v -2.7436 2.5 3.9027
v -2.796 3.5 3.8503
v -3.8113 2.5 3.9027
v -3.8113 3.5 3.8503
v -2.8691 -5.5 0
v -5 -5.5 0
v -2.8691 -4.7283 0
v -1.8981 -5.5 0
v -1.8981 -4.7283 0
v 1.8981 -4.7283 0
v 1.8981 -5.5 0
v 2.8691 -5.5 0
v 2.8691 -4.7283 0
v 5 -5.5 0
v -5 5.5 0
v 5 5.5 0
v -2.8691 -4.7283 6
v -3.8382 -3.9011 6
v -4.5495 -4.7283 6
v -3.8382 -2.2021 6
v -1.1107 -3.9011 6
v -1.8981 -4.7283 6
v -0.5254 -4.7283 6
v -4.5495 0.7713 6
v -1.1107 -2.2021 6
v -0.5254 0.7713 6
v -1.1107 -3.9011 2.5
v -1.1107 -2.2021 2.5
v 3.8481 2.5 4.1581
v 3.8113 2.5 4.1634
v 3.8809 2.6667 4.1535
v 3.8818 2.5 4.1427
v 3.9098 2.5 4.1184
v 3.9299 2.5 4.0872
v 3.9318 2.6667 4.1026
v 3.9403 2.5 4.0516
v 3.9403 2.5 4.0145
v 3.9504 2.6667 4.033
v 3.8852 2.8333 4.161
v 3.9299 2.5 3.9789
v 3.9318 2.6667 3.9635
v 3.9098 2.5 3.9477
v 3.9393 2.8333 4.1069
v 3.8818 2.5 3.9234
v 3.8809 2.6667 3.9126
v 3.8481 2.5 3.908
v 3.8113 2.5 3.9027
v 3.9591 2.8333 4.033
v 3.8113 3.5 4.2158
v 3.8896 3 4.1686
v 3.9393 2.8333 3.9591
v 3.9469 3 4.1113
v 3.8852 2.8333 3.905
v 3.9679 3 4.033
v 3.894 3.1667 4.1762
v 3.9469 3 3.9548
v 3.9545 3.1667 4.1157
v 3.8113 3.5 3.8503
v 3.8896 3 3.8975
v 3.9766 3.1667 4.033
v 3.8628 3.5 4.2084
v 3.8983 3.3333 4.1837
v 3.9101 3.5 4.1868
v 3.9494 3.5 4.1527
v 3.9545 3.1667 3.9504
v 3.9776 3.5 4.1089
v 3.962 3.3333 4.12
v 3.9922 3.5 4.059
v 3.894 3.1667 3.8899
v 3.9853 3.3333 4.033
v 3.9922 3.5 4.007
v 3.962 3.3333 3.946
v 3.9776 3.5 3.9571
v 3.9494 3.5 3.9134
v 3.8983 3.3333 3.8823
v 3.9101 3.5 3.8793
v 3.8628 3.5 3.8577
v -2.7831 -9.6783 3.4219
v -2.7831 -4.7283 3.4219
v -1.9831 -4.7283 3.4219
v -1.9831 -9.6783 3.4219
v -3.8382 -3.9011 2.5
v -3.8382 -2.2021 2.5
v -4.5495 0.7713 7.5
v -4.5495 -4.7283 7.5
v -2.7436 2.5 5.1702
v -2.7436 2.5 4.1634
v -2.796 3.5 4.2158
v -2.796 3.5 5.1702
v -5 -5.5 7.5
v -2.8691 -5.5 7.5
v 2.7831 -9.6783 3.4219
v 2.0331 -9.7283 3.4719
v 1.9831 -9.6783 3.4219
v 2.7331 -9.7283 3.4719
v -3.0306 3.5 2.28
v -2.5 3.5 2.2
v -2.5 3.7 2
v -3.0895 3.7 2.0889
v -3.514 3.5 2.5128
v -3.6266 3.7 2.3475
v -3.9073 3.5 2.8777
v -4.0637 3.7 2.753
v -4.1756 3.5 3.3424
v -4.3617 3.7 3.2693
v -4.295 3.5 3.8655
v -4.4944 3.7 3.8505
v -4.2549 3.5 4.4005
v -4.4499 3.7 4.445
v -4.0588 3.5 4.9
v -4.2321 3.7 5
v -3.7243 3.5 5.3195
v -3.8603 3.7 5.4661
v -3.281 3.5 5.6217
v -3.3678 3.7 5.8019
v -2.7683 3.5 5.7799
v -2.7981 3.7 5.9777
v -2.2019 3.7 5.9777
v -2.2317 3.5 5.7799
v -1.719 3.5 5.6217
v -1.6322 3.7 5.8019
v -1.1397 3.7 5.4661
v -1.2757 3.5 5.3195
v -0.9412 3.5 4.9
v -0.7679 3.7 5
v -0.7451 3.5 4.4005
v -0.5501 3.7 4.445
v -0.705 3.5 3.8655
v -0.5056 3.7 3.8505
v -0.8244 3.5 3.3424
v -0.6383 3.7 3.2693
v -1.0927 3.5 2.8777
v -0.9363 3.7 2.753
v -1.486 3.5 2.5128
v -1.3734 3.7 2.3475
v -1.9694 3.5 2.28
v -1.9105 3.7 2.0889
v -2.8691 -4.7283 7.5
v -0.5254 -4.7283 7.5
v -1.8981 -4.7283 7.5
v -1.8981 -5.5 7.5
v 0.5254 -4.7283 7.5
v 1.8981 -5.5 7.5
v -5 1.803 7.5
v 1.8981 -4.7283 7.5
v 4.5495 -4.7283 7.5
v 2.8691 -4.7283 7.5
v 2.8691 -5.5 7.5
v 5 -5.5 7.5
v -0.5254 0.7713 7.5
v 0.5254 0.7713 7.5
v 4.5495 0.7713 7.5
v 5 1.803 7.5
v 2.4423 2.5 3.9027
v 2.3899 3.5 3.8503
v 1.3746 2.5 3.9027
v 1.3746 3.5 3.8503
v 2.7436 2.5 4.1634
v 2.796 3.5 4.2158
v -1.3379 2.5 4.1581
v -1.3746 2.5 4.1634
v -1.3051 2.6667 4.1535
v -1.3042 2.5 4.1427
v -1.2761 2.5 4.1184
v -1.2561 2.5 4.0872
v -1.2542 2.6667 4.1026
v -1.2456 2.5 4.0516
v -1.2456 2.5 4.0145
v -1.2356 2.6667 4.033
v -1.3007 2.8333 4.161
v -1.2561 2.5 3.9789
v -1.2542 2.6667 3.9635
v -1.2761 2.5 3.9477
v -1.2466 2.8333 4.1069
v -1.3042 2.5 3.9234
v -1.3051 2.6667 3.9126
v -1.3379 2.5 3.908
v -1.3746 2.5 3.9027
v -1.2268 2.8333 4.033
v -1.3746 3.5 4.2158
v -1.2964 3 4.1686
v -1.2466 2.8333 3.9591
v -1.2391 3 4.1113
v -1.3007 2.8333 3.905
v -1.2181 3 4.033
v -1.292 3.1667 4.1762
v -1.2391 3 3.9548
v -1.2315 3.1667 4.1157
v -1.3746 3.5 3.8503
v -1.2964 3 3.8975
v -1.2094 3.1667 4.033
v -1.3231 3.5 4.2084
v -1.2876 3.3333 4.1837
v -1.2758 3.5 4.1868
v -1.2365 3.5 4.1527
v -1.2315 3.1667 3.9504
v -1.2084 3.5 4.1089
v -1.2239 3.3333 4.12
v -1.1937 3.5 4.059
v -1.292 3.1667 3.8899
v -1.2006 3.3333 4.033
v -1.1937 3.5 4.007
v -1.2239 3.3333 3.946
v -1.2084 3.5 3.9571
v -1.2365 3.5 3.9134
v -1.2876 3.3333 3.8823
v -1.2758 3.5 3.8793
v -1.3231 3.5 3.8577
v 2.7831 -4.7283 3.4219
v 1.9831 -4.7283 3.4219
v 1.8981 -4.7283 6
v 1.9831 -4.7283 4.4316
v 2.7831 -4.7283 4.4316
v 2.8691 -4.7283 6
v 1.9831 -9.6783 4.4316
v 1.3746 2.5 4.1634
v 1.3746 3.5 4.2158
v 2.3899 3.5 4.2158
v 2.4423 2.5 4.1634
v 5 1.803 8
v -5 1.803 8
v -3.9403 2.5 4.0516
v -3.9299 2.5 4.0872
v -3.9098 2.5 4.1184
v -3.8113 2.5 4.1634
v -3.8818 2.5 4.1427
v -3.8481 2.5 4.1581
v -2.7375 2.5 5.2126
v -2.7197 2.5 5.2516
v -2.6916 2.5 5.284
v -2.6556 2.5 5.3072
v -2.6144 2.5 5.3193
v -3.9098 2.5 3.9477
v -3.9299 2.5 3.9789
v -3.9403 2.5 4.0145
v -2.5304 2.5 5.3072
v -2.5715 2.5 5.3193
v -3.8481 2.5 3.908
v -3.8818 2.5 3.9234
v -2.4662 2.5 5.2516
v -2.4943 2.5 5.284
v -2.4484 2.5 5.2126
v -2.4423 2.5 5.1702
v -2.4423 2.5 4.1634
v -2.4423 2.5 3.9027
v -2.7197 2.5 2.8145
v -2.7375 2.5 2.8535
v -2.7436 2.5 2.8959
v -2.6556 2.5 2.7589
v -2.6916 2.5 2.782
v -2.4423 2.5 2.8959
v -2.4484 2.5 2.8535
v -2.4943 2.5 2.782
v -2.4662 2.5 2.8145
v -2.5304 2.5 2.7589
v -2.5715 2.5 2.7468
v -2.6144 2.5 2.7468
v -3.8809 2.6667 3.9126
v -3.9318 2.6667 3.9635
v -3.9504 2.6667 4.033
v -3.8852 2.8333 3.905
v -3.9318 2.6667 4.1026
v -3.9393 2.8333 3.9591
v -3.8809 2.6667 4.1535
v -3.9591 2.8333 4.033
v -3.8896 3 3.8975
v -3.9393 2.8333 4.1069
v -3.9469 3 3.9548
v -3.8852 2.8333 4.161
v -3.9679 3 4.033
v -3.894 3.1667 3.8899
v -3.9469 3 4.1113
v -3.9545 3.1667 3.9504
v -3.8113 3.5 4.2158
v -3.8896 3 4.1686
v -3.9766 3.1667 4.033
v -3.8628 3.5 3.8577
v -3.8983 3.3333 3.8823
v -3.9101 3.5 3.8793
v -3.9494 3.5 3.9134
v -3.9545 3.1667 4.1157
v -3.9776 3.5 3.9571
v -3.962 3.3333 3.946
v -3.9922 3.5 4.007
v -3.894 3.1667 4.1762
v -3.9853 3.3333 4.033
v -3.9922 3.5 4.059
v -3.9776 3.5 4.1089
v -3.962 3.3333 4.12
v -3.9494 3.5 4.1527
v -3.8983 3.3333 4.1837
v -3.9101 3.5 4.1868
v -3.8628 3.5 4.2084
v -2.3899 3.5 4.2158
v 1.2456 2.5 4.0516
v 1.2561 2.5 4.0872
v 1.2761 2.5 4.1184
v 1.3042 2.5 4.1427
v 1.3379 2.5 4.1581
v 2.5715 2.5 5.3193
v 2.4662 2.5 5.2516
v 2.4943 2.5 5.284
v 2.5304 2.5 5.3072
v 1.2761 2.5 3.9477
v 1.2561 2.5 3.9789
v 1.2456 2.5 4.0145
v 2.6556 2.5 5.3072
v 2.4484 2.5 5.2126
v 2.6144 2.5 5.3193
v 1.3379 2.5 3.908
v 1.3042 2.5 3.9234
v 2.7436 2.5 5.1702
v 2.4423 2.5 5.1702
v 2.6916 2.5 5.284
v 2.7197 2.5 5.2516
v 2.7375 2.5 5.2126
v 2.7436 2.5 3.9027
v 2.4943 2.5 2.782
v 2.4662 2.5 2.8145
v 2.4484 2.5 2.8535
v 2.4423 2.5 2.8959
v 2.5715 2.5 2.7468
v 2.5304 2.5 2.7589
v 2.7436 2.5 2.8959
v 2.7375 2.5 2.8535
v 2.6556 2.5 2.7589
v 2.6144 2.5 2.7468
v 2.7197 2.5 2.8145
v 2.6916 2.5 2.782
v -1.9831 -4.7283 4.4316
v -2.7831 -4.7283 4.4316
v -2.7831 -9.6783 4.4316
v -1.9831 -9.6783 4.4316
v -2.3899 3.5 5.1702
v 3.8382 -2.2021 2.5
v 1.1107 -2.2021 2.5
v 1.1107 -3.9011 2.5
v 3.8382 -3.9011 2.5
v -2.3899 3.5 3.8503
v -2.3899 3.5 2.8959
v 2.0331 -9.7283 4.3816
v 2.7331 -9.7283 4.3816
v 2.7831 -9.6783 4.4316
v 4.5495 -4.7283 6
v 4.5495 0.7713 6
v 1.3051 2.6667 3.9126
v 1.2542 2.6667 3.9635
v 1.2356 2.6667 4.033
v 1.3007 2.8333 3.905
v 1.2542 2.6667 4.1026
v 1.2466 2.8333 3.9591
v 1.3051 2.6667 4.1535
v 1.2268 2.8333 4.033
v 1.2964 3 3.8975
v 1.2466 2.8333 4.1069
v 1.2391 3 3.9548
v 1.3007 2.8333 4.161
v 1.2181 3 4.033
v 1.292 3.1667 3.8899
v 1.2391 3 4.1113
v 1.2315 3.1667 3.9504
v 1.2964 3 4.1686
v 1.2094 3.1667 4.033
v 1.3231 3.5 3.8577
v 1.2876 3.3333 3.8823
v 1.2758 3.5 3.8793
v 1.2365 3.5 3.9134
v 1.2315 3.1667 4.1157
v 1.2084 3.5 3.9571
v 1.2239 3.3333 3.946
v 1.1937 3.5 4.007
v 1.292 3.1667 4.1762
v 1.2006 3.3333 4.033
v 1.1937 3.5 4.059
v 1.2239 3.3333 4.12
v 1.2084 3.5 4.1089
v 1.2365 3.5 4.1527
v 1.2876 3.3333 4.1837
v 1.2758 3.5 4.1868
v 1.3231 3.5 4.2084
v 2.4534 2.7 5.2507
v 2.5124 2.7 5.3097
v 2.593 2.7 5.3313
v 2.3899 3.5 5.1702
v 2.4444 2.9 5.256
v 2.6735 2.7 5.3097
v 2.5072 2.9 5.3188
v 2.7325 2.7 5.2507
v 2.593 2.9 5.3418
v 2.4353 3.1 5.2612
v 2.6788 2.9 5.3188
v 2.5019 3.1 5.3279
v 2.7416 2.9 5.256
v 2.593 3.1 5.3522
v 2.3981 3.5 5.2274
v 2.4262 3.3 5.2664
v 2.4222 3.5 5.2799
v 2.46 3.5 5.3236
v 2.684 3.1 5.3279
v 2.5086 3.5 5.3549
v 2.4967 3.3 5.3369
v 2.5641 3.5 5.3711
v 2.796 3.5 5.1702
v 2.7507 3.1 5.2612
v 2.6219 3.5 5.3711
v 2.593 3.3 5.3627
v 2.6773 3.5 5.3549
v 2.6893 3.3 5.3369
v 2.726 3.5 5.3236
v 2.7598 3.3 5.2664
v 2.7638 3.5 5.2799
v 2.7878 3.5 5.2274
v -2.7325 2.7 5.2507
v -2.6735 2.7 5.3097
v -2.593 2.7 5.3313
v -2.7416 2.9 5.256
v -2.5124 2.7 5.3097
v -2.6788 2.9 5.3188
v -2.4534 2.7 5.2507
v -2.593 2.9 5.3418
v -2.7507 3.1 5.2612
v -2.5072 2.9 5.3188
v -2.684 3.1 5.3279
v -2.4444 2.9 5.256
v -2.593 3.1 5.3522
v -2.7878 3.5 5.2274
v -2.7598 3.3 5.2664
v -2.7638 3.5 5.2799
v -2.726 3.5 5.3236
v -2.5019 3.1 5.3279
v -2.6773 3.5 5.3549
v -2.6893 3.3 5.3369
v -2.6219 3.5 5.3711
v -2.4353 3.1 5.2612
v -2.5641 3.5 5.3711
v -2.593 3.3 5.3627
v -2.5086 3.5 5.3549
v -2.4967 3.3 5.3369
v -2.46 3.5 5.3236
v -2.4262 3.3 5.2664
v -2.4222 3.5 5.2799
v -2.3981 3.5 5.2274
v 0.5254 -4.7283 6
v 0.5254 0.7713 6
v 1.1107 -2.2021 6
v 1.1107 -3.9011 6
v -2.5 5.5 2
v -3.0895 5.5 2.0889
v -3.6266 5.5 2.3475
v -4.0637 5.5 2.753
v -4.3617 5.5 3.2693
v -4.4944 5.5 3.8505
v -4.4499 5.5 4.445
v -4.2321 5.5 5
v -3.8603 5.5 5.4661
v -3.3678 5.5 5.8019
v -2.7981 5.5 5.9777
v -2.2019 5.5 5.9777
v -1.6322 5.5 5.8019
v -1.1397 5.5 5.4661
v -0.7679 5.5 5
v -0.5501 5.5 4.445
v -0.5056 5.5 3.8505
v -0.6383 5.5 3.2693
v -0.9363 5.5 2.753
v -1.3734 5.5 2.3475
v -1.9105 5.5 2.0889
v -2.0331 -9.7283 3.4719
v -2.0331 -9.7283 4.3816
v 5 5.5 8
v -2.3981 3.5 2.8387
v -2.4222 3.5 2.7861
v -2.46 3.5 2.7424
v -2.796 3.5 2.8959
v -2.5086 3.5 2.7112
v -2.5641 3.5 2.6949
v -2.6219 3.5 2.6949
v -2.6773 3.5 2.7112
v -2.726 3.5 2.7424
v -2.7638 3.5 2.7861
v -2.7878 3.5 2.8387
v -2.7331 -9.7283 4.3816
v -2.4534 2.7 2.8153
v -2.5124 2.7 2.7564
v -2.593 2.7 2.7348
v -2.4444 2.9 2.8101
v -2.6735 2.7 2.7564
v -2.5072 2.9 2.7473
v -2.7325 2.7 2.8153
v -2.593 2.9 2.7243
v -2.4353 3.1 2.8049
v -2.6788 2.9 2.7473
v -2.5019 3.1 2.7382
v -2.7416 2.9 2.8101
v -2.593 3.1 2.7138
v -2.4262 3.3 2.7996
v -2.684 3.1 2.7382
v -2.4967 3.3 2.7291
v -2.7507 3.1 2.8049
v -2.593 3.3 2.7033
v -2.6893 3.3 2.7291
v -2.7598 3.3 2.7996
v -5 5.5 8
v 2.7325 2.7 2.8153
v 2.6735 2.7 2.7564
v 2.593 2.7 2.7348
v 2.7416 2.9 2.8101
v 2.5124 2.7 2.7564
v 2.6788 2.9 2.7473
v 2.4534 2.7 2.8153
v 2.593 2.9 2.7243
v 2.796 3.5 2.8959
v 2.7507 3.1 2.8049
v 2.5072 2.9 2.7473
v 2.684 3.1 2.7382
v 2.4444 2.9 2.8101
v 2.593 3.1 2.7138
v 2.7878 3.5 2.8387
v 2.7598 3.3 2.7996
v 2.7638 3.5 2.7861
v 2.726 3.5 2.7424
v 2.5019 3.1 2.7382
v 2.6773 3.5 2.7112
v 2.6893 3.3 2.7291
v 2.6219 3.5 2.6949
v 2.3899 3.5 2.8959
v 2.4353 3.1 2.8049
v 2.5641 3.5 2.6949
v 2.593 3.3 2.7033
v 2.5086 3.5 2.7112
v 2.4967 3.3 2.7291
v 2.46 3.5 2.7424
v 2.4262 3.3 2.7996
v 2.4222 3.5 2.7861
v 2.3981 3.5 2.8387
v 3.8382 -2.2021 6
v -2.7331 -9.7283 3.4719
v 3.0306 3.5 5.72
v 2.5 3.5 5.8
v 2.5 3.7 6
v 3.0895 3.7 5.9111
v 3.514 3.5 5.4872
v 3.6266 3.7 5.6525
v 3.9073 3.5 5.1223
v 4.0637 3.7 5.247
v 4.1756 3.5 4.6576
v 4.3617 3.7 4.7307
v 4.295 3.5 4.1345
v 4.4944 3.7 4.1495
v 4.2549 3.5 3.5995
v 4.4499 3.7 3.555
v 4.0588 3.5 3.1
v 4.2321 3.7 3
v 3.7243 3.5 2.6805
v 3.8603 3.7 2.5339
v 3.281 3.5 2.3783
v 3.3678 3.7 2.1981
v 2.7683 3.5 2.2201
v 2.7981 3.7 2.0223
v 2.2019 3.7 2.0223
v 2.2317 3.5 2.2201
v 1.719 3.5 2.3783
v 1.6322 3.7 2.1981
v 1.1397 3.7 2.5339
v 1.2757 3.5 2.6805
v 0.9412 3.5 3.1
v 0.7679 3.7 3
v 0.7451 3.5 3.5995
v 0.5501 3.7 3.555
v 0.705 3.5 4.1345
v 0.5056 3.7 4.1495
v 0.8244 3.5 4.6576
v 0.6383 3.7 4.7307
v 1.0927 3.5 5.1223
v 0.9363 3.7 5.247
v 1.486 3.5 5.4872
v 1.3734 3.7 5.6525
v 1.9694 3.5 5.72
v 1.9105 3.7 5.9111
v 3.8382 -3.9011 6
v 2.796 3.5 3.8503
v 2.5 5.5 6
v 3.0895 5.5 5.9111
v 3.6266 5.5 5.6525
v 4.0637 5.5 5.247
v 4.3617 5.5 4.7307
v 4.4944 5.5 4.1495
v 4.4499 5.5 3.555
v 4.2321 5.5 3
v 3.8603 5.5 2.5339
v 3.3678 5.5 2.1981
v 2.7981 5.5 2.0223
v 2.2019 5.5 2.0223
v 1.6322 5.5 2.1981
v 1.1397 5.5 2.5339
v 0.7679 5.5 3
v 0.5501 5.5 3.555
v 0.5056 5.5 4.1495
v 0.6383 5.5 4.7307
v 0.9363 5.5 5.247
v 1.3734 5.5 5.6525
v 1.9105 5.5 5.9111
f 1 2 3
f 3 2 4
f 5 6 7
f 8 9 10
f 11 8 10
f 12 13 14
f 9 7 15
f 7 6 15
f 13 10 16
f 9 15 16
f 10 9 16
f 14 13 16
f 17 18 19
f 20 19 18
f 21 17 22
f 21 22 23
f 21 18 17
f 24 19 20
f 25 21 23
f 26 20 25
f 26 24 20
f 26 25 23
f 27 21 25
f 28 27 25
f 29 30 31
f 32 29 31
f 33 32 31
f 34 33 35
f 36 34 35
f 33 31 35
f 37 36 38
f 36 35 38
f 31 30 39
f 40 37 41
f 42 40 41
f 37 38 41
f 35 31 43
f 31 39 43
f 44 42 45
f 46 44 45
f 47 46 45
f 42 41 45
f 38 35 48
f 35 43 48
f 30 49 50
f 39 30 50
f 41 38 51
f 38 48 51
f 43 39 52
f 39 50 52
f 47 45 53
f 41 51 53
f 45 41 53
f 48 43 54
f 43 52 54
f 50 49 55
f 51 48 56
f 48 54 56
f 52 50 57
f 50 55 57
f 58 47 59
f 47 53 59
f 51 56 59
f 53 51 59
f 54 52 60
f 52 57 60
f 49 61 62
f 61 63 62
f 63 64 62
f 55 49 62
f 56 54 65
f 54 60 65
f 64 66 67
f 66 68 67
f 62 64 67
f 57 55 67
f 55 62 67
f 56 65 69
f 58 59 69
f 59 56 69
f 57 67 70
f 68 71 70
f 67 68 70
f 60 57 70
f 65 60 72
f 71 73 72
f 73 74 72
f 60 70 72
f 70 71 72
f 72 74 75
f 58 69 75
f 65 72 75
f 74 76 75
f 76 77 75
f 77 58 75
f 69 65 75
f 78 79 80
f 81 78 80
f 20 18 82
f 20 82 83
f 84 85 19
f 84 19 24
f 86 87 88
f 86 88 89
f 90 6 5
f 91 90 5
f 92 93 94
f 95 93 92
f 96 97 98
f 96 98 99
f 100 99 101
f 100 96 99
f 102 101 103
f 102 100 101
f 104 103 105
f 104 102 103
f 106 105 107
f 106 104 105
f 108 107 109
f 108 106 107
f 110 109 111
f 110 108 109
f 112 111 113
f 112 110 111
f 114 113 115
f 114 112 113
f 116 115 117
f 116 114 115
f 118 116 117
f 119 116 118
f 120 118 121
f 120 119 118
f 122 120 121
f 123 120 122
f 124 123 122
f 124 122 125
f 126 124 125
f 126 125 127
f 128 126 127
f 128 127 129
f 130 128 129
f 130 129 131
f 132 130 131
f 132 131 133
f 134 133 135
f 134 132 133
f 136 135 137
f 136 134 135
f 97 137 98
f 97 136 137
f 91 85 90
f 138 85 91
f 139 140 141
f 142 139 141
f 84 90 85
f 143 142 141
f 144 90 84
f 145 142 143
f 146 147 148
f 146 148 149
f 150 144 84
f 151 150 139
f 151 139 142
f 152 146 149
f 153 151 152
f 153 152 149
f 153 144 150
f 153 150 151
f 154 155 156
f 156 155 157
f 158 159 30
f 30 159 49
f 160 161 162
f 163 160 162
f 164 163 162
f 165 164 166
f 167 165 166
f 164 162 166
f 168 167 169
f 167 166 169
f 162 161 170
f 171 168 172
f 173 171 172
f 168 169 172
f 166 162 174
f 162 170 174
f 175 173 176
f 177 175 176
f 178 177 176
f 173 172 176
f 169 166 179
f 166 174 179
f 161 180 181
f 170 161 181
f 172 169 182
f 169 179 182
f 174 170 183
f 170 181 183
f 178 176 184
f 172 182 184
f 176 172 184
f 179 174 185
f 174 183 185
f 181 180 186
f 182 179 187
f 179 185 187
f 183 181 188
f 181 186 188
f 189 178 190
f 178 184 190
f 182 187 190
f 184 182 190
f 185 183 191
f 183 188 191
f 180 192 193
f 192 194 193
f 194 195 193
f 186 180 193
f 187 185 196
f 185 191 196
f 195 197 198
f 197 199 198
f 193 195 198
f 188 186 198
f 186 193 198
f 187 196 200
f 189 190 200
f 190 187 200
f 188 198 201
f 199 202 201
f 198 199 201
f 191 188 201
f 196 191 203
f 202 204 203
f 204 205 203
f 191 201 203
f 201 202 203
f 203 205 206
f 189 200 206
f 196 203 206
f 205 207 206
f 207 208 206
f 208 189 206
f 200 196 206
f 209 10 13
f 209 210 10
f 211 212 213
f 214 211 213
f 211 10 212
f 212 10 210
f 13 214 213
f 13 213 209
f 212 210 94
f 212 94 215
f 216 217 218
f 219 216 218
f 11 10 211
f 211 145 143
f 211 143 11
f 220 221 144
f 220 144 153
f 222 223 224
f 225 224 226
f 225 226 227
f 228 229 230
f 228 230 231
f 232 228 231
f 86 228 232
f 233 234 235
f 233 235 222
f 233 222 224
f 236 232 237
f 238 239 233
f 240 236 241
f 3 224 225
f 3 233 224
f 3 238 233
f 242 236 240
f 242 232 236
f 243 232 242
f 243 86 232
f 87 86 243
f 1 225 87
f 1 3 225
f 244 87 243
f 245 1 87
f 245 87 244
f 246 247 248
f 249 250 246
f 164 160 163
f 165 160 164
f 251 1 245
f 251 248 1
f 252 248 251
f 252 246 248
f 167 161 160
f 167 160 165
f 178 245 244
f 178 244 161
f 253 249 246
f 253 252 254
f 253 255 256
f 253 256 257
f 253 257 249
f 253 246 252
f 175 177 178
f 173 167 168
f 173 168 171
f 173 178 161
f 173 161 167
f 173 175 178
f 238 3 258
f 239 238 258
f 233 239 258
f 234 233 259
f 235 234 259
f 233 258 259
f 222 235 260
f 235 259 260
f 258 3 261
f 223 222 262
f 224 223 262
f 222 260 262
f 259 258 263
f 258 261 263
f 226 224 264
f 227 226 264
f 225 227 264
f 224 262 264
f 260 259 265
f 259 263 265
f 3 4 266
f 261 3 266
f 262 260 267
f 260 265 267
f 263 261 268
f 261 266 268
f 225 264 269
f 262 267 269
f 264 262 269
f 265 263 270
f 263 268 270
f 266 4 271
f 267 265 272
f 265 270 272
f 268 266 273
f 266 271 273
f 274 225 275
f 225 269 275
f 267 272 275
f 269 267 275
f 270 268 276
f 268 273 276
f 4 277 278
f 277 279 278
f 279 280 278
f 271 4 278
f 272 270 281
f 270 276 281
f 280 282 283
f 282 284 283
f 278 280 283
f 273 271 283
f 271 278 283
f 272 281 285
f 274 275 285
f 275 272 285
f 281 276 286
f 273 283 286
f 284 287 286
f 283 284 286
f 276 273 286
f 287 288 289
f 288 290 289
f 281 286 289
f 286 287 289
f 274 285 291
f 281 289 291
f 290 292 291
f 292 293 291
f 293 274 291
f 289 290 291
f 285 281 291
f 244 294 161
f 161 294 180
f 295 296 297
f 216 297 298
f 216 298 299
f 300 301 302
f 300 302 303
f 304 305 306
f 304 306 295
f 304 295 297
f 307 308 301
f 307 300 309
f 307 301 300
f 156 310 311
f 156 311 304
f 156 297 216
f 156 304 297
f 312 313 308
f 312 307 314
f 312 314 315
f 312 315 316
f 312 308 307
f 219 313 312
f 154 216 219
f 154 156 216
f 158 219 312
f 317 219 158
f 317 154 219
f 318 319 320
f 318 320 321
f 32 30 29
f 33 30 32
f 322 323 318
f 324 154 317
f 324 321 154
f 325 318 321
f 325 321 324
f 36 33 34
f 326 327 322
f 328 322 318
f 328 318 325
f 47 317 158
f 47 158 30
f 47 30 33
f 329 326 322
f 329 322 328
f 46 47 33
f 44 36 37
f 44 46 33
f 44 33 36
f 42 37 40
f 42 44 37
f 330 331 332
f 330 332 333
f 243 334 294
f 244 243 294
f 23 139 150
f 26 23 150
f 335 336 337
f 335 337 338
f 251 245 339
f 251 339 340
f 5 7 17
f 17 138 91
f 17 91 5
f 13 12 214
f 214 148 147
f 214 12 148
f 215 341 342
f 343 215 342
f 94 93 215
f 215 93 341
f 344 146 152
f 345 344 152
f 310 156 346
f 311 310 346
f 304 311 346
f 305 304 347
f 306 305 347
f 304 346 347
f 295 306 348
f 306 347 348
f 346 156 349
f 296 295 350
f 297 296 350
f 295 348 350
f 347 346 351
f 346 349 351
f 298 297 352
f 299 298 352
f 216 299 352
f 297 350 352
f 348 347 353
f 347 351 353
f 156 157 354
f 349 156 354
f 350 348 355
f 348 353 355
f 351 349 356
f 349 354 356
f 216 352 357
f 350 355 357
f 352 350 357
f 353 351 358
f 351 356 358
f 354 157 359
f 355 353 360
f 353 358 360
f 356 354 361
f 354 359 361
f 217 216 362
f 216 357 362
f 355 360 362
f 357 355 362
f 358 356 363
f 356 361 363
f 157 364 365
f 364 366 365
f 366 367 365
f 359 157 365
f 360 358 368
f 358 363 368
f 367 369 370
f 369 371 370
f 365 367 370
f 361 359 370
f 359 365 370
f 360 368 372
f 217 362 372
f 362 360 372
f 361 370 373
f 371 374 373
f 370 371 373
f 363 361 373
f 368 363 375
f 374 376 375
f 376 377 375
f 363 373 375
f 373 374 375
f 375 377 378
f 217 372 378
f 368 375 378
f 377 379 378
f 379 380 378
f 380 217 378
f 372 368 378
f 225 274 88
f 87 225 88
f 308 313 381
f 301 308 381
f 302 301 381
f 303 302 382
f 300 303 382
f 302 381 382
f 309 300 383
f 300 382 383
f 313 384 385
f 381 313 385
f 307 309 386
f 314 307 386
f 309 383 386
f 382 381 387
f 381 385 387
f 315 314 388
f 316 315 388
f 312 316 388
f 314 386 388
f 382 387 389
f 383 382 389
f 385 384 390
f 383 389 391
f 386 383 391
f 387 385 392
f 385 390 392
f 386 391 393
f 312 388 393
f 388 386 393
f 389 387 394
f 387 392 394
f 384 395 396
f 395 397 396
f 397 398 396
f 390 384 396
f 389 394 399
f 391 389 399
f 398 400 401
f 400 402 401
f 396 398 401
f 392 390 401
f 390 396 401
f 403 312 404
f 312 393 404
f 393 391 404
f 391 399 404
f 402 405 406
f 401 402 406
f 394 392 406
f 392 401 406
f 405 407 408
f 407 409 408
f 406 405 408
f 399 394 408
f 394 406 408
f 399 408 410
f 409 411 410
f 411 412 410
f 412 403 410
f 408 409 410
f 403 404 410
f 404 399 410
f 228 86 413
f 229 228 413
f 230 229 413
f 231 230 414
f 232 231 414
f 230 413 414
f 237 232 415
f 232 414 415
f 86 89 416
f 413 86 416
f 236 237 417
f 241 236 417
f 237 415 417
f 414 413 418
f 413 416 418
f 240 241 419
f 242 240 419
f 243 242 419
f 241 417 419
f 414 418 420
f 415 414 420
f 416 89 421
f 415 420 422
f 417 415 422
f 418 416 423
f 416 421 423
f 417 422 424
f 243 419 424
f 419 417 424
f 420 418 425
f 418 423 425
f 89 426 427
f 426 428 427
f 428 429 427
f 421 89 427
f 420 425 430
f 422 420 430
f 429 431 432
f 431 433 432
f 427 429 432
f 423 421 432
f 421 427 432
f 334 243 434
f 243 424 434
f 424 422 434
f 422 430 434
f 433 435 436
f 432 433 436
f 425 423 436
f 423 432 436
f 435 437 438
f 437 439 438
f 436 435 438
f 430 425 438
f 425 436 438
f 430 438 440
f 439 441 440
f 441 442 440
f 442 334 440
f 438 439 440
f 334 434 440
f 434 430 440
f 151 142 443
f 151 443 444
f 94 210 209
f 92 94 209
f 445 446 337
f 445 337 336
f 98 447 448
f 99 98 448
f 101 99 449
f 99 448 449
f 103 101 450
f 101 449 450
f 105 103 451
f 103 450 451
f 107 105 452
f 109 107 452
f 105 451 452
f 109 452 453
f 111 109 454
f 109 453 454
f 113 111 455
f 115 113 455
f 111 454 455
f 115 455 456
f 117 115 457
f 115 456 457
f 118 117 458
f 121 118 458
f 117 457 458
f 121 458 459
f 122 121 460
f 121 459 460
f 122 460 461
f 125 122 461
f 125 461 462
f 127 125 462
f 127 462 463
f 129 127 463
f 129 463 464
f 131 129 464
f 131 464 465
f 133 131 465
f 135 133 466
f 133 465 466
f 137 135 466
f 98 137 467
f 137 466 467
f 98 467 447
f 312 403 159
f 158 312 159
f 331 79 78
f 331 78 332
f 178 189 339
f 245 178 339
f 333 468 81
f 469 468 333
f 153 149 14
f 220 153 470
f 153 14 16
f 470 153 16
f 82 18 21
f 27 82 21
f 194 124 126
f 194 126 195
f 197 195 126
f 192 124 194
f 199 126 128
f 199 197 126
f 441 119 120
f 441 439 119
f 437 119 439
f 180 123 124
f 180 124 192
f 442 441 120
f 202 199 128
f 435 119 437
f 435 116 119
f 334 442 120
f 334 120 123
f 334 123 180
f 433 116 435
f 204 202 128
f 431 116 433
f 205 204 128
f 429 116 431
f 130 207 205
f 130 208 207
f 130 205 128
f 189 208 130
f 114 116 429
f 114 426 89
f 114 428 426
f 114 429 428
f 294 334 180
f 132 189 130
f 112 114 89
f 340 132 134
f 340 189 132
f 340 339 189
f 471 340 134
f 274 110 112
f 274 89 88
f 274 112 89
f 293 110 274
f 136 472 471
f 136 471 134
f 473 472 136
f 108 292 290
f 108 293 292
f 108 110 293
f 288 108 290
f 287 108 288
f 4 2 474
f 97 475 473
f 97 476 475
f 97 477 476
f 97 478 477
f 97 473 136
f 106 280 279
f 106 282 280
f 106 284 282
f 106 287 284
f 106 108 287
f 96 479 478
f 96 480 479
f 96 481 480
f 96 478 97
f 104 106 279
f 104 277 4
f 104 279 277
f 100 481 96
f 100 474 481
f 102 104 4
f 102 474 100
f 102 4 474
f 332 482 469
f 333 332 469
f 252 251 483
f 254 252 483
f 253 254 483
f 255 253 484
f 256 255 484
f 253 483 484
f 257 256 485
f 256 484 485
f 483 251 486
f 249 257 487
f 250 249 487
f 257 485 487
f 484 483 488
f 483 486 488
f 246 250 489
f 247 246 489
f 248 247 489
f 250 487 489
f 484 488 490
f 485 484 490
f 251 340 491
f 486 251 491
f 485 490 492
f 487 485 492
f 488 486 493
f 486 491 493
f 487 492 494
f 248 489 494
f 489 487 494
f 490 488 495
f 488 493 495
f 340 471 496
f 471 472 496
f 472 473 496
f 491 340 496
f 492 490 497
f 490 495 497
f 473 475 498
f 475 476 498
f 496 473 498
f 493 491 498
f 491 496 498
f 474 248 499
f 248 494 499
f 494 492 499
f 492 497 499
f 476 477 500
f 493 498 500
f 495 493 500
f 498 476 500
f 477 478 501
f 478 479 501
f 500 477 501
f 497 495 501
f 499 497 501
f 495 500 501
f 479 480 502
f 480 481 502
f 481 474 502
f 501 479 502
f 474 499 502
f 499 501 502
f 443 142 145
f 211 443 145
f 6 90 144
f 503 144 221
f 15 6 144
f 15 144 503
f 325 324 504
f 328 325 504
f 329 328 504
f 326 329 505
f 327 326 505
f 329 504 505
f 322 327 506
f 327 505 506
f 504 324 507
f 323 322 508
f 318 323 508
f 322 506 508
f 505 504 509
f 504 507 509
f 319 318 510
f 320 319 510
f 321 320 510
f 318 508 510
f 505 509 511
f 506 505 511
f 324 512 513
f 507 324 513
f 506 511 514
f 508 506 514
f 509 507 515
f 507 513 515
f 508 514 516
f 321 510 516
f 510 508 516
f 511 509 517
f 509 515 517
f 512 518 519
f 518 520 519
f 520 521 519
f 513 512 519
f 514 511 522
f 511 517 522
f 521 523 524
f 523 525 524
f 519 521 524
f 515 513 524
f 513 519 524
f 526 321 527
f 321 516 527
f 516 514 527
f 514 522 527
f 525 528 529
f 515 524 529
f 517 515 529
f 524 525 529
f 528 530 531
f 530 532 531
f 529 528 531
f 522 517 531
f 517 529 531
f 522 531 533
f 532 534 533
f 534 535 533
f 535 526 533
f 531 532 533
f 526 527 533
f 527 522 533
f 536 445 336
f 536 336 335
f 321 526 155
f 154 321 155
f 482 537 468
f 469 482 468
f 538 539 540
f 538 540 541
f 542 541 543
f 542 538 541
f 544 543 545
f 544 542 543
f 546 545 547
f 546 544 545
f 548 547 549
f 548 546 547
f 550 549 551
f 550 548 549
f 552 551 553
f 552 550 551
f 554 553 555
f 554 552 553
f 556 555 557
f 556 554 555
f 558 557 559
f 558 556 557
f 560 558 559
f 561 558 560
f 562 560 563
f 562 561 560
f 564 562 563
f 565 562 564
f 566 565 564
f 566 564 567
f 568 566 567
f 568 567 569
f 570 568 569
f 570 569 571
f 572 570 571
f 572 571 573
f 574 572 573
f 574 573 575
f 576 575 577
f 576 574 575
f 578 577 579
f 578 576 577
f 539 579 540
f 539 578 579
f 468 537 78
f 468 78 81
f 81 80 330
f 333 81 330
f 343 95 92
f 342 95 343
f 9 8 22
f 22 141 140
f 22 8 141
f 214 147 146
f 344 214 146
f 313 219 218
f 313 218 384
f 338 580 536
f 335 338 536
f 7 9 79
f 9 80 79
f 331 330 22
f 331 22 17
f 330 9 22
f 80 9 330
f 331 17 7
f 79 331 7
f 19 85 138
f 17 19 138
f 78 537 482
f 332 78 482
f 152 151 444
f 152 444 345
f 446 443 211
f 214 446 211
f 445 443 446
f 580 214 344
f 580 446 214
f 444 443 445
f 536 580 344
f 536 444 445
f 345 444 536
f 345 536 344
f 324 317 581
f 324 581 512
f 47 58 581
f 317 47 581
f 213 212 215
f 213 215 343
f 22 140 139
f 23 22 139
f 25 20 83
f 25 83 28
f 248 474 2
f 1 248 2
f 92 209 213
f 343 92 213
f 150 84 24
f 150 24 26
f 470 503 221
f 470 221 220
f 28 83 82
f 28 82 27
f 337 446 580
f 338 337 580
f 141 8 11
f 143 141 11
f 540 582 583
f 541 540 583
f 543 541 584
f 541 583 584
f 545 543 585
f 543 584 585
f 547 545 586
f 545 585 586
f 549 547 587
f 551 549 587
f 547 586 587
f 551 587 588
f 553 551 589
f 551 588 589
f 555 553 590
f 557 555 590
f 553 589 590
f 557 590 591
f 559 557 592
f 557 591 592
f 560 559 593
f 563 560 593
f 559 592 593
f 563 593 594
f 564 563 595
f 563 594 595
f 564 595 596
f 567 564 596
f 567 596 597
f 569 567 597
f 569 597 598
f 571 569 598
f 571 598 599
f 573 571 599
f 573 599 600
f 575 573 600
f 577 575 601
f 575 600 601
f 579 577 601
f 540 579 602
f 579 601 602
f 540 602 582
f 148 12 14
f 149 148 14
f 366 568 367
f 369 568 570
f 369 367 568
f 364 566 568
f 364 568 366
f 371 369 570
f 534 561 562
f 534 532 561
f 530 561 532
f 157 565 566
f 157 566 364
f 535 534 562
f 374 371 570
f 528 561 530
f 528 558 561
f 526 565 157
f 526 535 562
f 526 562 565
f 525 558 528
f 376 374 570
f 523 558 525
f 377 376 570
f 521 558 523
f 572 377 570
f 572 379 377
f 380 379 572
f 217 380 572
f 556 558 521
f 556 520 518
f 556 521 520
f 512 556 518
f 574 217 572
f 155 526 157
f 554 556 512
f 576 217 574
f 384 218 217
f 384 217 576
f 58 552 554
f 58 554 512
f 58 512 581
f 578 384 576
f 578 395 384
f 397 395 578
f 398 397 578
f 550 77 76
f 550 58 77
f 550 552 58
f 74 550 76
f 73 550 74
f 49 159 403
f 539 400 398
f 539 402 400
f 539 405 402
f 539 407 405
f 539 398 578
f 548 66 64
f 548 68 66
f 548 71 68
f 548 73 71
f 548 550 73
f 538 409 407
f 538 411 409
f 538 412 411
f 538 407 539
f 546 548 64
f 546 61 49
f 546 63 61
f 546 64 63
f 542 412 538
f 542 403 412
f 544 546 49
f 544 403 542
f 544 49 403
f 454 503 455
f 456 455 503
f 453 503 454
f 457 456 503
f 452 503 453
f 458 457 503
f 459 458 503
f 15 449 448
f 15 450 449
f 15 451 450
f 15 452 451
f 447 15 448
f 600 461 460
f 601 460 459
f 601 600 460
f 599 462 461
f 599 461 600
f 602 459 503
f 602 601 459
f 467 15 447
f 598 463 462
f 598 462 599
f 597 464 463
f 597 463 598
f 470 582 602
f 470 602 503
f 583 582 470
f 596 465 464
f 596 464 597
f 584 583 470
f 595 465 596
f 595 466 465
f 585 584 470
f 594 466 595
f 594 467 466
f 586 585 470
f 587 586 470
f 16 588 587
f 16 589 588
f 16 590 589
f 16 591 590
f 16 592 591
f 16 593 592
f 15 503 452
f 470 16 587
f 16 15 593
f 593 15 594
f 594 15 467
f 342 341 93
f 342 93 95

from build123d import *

# Parameters (mm, degrees)
CROQUIS1_W                      = 10
CROQUIS1_H                      = 11
SALIENTE_EXTRUIR1_DEPTH         = 8
CROQUIS2_R                      = 2
CORTAR_EXTRUIR1_DEPTH           = 2
CROQUIS3_W                      = 10
CROQUIS3_H                      = 7.302971928
CORTAR_EXTRUIR2_DEPTH           = 0.5
CROQUIS4_W                      = 4.024100916
CROQUIS4_H                      = 5.499604586
CORTAR_EXTRUIR3_DEPTH           = 1.5
CROQUIS5_W                      = 2.727446176
CROQUIS5_H                      = 1.699064831
CORTAR_EXTRUIR4_DEPTH           = 3.5
CORTAR_EXTRUIR5_DEPTH           = 1
CORTAR_EXTRUIR5_DRAFT           = -3
CORTAR_EXTRUIR5_PROFILE_2_DEPTH = 1
CORTAR_EXTRUIR5_PROFILE_2_DRAFT = -3
CHAFL_N1_SIZE                   = 0.2
CORTAR_EXTRUIR6_DEPTH           = 11.559356041
CROQUIS8_W                      = 0.8
CROQUIS8_H                      = 1.009702069
SALIENTE_EXTRUIR2_DEPTH         = 5
CHAFL_N2_SIZE                   = 0.05


with BuildPart() as part:
    # Croquis1 → Saliente-Extruir1 (new body)
    with BuildSketch(Plane.XY):
        Rectangle(CROQUIS1_W, CROQUIS1_H)
    extrude(amount=SALIENTE_EXTRUIR1_DEPTH)

    # Croquis2 → Cortar-Extruir1 (cut)
    with BuildSketch(Plane(origin=(0, 5.5, 0), x_dir=(1, 0, 0), z_dir=(0, 1, 0))):
        with Locations(Location((2.5, -4, 0), (0, 0, 270))):
            Circle(CROQUIS2_R)
        with Locations(Location((-2.5, -4, 0), (0, 0, 90))):
            Circle(CROQUIS2_R)
    extrude(amount=-CORTAR_EXTRUIR1_DEPTH, mode=Mode.SUBTRACT)

    # Croquis3 → Cortar-Extruir2 (cut)
    with BuildSketch(Plane.XY.offset(8)):
        with Locations((0, -1.848514036)):
            Rectangle(CROQUIS3_W, CROQUIS3_H)
    extrude(amount=-CORTAR_EXTRUIR2_DEPTH, mode=Mode.SUBTRACT)

    # Croquis4 → Cortar-Extruir3 (cut)
    with BuildSketch(Plane.XY.offset(7.5)):
        with Locations((-2.537419189, -1.978516284)):
            Rectangle(CROQUIS4_W, CROQUIS4_H)
        with Locations((2.537419189, -1.978516284)):
            Rectangle(CROQUIS4_W, CROQUIS4_H)
    extrude(amount=-CORTAR_EXTRUIR3_DEPTH, mode=Mode.SUBTRACT)

    # Croquis5 → Cortar-Extruir4 (cut)
    with BuildSketch(Plane.XY.offset(6)):
        with Locations((-2.474433562, -3.051609862)):
            Rectangle(CROQUIS5_W, CROQUIS5_H)
        with Locations((2.474433562, -3.051609862)):
            Rectangle(CROQUIS5_W, CROQUIS5_H)
    extrude(amount=-CORTAR_EXTRUIR4_DEPTH, mode=Mode.SUBTRACT)


with BuildPart() as cortar_extruir5_tool:
    # Croquis6 → Cortar-Extruir5 (with draft: the straight prism first)
    with BuildSketch(Plane(origin=(0, 3.5, 0), x_dir=(1, 0, 0), z_dir=(0, 1, 0))):
        with BuildLine():
            Line((-2.796040432, -4.215779763), (-2.796040432, -5.17015319))
            ThreePointArc((-2.796040432, -5.17015319), (-2.592982256, -5.373211365), (-2.38992408, -5.17015319))
            Line((-2.38992408, -5.17015319), (-2.38992408, -4.215779763))
            Line((-2.38992408, -4.215779763), (-1.374633201, -4.215779763))
            ThreePointArc((-1.374633201, -4.215779763), (-1.191880843, -4.033027405), (-1.374633201, -3.850275046))
            Line((-1.374633201, -3.850275046), (-2.38992408, -3.850275046))
            Line((-2.38992408, -3.850275046), (-2.38992408, -2.89590162))
            ThreePointArc((-2.38992408, -2.89590162), (-2.592982256, -2.692843444), (-2.796040432, -2.89590162))
            Line((-2.796040432, -2.89590162), (-2.796040432, -3.850275046))
            Line((-2.796040432, -3.850275046), (-3.811331312, -3.850275046))
            ThreePointArc((-3.811331312, -3.850275046), (-3.99408367, -4.033027405), (-3.811331312, -4.215779763))
            Line((-3.811331312, -4.215779763), (-2.796040432, -4.215779763))
        make_face()
    extrude(amount=-CORTAR_EXTRUIR5_DEPTH)
    # Cortar-Extruir5: the draft: its side faces are tilted about the plane it starts from
    cortar_extruir5_sides = [cortar_extruir5_tool.faces().sort_by_distance(p)[0] for p in [
        (-2.796040432, 3, 3.373088333),
        (-3.303685872, 3, 3.850275046),
        (-3.99408367, 3, 4.033027405),
        (-3.303685872, 3, 4.215779763),
        (-2.796040432, 3, 4.692966476),
        (-2.592982256, 3, 5.373211365),
        (-2.38992408, 3, 4.692966476),
        (-1.882278641, 3, 4.215779763),
        (-1.191880843, 3, 4.033027405),
        (-1.882278641, 3, 3.850275046),
        (-2.38992408, 3, 3.373088333),
        (-2.592982256, 3, 2.692843444),
    ]]
    draft(cortar_extruir5_sides, Plane(origin=(0, 3.5, 0), x_dir=(1, 0, 0), z_dir=(0, 1, 0)), CORTAR_EXTRUIR5_DRAFT)


with BuildPart() as part_1:
    add(part.part)

    # Cortar-Extruir5: cut by cortar_extruir5_tool
    add(cortar_extruir5_tool.part, mode=Mode.SUBTRACT)


with BuildPart() as cortar_extruir5_profile_2_tool:
    # Croquis6 → Cortar-Extruir5 profile 2 (with draft: the straight prism first)
    with BuildSketch(Plane(origin=(0, 3.5, 0), x_dir=(1, 0, 0), z_dir=(0, 1, 0))):
        with BuildLine():
            Line((2.38992408, -4.215779763), (2.38992408, -5.17015319))
            ThreePointArc((2.38992408, -5.17015319), (2.592982256, -5.373211365), (2.796040432, -5.17015319))
            Line((2.796040432, -5.17015319), (2.796040432, -4.215779763))
            Line((2.796040432, -4.215779763), (3.811331312, -4.215779763))
            ThreePointArc((3.811331312, -4.215779763), (3.99408367, -4.033027405), (3.811331312, -3.850275046))
            Line((3.811331312, -3.850275046), (2.796040432, -3.850275046))
            Line((2.796040432, -3.850275046), (2.796040432, -2.89590162))
            ThreePointArc((2.796040432, -2.89590162), (2.592982256, -2.692843444), (2.38992408, -2.89590162))
            Line((2.38992408, -2.89590162), (2.38992408, -3.850275046))
            Line((2.38992408, -3.850275046), (1.374633201, -3.850275046))
            ThreePointArc((1.374633201, -3.850275046), (1.191880843, -4.033027405), (1.374633201, -4.215779763))
            Line((1.374633201, -4.215779763), (2.38992408, -4.215779763))
        make_face()
    extrude(amount=-CORTAR_EXTRUIR5_PROFILE_2_DEPTH)
    # Cortar-Extruir5 profile 2: the draft: its side faces are tilted about the plane it starts from
    cortar_extruir5_profile_2_sides = [cortar_extruir5_profile_2_tool.faces().sort_by_distance(p)[0] for p in [
        (2.38992408, 3, 4.692966476),
        (2.592982256, 3, 5.373211365),
        (2.796040432, 3, 4.692966476),
        (3.303685872, 3, 4.215779763),
        (3.99408367, 3, 4.033027405),
        (3.303685872, 3, 3.850275046),
        (2.796040432, 3, 3.373088333),
        (2.592982256, 3, 2.692843444),
        (2.38992408, 3, 3.373088333),
        (1.882278641, 3, 3.850275046),
        (1.191880843, 3, 4.033027405),
        (1.882278641, 3, 4.215779763),
    ]]
    draft(cortar_extruir5_profile_2_sides, Plane(origin=(0, 3.5, 0), x_dir=(1, 0, 0), z_dir=(0, 1, 0)), CORTAR_EXTRUIR5_PROFILE_2_DRAFT)


with BuildPart() as part_2:
    add(part_1.part)

    # Cortar-Extruir5 profile 2: cut by cortar_extruir5_profile_2_tool
    add(cortar_extruir5_profile_2_tool.part, mode=Mode.SUBTRACT)

    # Chaflán1
    chafl_n1_edges = [part_2.edges().sort_by_distance(p)[0] for p in [
        (2.5, 3.5, 2),
        (-2.5, 3.5, 6),
    ]]
    chamfer(chafl_n1_edges, length=CHAFL_N1_SIZE)

    # Croquis7 → Cortar-Extruir6 (cut, through all)
    with BuildSketch(Plane.XY.offset(7.5)):
        Polygon((-2.869109202, -5.079330001), (-2.869109202, -5.629900541), (-1.898102979, -5.629900541), (-1.898102979, -5.079330001), (-1.898102979, -4.728318577), (-2.869109202, -4.728318577), align=None)
        Polygon((2.869109202, -4.728318577), (2.869109202, -5.079330001), (2.869109202, -5.629900541), (1.898102979, -5.629900541), (1.898102979, -5.079330001), (1.898102979, -4.728318577), align=None)
    extrude(amount=-CORTAR_EXTRUIR6_DEPTH, mode=Mode.SUBTRACT)

    # Croquis8 → Saliente-Extruir2 (add)
    with BuildSketch(Plane.XZ.offset(4.728318577)):
        with Locations((-2.383102979, 3.926715173)):
            Rectangle(CROQUIS8_W, CROQUIS8_H)
        with Locations((2.383102979, 3.926715173)):
            Rectangle(CROQUIS8_W, CROQUIS8_H)
    extrude(amount=SALIENTE_EXTRUIR2_DEPTH)

    # Chaflán2
    chafl_n2_edges = [part_2.edges().sort_by_distance(p)[0] for p in [
        (-1.983102979, -9.728318577, 3.926715172),
        (-2.383102979, -9.728318577, 4.431566207),
        (-2.783102979, -9.728318577, 3.926715172),
        (-2.383102979, -9.728318577, 3.421864138),
        (2.783102979, -9.728318577, 3.926715172),
        (2.383102979, -9.728318577, 4.431566207),
        (1.983102979, -9.728318577, 3.926715172),
        (2.383102979, -9.728318577, 3.421864138),
    ]]
    chamfer(chafl_n2_edges, length=CHAFL_N2_SIZE)


solid = part_2.part
